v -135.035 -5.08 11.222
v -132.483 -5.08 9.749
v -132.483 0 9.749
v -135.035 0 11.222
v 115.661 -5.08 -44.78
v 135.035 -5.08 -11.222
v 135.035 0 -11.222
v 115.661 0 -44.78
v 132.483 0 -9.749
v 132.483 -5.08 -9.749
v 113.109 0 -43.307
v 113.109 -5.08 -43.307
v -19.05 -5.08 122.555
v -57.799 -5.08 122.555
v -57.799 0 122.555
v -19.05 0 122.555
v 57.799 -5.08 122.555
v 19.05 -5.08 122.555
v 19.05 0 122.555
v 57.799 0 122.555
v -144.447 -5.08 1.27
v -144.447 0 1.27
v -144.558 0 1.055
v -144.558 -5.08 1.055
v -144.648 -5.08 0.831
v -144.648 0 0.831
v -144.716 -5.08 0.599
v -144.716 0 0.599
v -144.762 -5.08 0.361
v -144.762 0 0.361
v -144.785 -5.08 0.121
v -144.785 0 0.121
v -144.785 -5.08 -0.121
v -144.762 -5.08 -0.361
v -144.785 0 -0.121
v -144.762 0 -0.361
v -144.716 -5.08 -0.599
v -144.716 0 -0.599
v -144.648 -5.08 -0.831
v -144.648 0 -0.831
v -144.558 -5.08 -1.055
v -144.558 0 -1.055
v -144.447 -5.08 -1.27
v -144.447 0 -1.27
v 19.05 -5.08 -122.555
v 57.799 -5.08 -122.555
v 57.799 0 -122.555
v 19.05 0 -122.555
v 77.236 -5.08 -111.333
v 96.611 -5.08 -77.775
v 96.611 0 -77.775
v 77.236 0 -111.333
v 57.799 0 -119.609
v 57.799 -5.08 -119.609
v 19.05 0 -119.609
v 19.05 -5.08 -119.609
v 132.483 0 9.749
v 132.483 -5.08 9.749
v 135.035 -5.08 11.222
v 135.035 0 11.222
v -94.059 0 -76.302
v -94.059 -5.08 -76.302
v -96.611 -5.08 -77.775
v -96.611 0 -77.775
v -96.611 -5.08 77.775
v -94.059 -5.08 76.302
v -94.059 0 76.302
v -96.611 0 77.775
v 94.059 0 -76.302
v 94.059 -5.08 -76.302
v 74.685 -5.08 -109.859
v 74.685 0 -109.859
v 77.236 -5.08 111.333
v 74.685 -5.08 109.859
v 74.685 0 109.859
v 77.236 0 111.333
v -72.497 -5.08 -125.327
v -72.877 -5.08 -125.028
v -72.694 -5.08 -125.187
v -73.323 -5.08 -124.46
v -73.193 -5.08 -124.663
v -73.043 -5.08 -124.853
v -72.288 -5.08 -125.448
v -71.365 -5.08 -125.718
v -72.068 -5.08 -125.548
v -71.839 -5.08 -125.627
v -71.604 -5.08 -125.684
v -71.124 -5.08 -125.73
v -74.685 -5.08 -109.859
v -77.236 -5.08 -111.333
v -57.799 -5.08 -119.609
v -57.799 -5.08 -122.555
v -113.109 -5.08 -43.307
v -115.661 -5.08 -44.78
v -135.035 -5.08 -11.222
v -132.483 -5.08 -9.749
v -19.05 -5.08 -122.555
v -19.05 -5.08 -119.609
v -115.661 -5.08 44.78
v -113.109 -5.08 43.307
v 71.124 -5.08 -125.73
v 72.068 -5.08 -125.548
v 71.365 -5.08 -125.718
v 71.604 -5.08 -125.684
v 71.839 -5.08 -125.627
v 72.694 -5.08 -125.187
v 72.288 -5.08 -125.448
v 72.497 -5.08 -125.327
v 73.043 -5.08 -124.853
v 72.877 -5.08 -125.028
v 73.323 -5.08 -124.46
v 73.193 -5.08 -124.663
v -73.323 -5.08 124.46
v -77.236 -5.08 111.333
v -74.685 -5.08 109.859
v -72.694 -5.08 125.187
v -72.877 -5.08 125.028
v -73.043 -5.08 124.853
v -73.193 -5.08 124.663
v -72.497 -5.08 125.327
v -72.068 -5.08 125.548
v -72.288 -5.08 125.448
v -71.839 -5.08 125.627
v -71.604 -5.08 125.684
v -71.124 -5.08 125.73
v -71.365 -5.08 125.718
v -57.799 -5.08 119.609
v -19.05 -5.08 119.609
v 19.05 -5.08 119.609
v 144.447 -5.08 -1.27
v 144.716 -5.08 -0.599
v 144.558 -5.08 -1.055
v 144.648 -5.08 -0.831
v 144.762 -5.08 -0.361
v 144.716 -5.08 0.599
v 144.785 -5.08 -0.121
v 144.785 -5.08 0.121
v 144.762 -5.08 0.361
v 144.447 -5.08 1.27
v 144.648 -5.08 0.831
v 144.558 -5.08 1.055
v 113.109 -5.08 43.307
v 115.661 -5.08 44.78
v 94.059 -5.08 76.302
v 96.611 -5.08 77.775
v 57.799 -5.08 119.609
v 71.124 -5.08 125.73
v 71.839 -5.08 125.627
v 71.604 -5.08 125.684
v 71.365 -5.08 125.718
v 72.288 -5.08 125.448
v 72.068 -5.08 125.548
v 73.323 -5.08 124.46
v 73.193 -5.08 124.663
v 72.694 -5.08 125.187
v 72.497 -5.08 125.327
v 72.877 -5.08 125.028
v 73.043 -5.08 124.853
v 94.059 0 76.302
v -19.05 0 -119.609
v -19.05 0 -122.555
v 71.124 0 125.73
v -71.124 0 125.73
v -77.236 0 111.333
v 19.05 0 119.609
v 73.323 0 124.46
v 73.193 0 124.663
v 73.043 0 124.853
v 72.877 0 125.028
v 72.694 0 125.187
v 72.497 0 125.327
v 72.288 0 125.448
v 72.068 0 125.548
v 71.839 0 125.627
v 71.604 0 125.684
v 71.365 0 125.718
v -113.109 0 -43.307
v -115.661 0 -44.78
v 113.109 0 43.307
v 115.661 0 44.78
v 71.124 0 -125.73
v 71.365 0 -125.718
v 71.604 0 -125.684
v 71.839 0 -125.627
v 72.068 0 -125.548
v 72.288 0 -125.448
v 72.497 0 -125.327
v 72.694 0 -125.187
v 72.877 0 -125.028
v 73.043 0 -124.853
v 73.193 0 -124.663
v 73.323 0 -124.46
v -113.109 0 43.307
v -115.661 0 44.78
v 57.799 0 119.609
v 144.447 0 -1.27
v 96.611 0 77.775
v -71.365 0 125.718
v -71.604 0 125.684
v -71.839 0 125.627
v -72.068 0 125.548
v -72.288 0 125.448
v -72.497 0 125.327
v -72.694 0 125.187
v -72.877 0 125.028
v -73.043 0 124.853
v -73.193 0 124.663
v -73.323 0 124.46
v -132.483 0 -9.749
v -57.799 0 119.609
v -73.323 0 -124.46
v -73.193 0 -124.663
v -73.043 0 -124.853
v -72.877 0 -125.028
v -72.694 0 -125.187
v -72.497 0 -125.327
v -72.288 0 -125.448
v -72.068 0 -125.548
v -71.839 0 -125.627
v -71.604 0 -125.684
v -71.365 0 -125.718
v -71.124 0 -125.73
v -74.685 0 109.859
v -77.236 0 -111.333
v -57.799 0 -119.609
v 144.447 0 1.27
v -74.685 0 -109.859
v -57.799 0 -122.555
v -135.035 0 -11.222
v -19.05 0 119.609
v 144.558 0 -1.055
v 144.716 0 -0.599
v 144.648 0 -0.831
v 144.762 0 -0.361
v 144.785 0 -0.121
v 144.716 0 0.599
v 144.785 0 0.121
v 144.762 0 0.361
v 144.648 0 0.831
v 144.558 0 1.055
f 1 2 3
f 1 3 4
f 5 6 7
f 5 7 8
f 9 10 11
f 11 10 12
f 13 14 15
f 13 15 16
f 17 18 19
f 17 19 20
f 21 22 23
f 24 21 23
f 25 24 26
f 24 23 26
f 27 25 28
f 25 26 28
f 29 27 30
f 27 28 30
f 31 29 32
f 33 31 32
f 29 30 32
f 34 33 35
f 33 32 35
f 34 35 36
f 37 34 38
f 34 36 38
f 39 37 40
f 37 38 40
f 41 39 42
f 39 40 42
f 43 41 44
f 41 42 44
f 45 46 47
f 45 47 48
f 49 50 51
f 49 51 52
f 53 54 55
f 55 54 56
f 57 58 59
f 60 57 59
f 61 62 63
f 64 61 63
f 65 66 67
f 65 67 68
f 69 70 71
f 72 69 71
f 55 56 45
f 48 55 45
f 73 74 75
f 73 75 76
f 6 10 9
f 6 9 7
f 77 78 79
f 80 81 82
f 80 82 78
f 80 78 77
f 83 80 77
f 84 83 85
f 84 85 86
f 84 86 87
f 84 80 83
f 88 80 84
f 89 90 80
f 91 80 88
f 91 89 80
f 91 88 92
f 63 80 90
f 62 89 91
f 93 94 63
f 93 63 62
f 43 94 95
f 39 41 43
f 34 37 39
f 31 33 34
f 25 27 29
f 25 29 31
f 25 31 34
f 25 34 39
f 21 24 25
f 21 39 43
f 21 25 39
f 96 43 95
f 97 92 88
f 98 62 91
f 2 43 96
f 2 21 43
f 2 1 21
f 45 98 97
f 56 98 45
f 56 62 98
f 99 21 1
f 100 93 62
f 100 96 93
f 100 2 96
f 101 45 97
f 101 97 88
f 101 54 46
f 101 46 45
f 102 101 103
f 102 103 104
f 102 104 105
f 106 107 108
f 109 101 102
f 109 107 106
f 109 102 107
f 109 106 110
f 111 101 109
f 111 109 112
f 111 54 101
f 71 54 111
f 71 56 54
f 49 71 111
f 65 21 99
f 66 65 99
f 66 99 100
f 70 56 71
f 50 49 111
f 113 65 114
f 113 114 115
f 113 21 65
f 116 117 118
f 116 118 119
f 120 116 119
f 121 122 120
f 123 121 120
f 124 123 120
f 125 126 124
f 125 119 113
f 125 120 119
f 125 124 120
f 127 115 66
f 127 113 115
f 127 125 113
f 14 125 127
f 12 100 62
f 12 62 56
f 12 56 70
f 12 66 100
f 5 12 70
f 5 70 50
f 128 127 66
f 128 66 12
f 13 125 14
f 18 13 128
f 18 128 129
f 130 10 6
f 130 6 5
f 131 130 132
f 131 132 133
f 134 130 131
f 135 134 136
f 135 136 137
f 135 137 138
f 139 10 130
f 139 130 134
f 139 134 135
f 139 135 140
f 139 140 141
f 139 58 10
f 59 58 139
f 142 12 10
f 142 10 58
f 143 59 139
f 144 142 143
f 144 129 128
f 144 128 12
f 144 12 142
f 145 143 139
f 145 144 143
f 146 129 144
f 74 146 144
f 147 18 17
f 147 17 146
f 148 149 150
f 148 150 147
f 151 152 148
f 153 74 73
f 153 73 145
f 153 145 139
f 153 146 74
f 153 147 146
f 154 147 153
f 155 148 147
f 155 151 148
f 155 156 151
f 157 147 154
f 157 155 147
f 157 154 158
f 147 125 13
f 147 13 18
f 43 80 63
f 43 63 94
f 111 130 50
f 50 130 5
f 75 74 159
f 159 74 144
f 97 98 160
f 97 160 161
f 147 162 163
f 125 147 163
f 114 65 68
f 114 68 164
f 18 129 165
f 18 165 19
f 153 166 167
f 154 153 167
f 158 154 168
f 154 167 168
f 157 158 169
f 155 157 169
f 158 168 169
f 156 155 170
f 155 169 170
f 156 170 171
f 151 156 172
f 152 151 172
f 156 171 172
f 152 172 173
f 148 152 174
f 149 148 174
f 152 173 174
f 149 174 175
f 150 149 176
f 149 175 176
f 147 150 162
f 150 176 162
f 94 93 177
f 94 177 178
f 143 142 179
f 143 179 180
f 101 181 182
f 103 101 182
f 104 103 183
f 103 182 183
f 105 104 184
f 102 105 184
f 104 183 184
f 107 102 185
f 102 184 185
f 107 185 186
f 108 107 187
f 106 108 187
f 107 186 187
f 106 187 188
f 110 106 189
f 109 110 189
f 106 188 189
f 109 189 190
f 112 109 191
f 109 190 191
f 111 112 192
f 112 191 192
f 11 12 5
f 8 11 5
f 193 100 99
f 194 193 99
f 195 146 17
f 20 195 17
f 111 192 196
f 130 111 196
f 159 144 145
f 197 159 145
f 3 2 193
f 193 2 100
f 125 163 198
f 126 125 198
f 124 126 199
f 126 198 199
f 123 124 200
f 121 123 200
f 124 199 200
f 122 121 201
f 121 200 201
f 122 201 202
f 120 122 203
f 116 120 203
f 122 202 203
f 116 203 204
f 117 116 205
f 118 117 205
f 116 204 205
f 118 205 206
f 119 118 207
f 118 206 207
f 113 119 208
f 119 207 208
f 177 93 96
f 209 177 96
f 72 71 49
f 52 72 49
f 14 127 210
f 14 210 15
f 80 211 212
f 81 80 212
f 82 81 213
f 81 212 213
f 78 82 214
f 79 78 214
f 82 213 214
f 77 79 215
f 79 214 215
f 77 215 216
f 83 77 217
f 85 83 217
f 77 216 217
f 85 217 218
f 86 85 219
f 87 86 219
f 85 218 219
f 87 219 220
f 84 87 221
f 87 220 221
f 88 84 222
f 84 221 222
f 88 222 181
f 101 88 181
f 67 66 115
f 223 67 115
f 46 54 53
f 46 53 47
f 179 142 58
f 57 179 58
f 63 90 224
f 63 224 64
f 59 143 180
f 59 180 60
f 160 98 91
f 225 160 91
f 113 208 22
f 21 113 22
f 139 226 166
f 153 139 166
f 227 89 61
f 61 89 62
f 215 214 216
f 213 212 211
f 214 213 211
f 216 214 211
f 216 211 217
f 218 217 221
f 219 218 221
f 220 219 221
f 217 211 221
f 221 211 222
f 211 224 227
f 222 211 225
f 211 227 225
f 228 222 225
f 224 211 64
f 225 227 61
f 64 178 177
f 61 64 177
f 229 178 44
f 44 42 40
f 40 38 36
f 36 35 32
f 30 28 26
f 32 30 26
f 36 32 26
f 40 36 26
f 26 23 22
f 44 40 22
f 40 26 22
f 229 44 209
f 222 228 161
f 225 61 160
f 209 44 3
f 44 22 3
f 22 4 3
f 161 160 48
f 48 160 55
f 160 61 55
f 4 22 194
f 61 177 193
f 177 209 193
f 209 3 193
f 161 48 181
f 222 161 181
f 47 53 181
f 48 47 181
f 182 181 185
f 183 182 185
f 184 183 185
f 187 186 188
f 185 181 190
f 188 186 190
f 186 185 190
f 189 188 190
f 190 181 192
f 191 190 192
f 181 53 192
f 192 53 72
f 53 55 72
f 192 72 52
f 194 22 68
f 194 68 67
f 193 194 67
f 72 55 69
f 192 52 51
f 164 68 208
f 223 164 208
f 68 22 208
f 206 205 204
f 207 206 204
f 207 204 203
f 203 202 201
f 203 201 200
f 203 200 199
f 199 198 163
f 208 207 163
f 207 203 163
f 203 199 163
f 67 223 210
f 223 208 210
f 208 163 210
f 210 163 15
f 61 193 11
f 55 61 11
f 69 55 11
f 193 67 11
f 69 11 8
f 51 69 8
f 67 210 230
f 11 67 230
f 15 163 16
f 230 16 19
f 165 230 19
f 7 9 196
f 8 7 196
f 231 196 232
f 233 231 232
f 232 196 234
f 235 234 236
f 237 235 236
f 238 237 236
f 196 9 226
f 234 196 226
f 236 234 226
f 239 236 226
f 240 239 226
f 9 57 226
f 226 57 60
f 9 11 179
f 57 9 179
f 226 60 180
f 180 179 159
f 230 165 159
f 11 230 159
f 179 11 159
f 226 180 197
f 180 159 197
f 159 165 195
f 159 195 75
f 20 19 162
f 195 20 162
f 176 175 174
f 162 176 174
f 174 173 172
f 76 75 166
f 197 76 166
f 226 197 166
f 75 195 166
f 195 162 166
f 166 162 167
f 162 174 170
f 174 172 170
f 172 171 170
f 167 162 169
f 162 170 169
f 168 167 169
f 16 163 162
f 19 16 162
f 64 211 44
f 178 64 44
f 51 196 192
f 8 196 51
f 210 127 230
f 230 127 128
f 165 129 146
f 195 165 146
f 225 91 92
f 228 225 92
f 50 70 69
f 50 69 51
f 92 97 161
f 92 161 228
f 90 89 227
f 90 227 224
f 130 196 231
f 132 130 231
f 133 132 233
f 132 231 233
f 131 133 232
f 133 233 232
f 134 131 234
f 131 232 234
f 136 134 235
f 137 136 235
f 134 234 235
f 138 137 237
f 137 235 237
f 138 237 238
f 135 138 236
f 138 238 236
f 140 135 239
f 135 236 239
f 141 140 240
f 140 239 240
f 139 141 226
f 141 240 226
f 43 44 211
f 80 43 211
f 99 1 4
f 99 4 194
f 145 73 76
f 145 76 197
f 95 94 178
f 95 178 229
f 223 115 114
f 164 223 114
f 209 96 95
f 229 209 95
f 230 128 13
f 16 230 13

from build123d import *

# Parameters (mm, degrees)
F1_DEPTH        = 5.08
F2_W            = 38.7485525078
F2_H            = 2.9464
F3_DEPTH        = 5.08
F3_COPIES_COUNT = 6


# Not quite as in the source:
# - a pattern or mirror of a feature is missing from the dataset's text; its kind, count and spacing are read off the source's solid


with BuildPart() as f1:
    # F0 (on Front) → F1 (new body)
    with BuildSketch(Plane.XZ):
        with BuildLine():
            Line((71.1237796615, 125.73), (-71.1237796615, 125.73))
            ThreePointArc((-71.1237796615, 125.73), (-72.3937796615, 125.3897045256), (-73.3234841871, 124.46))
            Line((-73.3234841871, 124.46), (-144.4472638486, 1.27))
            ThreePointArc((-144.4472638486, 1.27), (-144.7875593229, 0), (-144.4472638486, -1.27))
            Line((-144.4472638486, -1.27), (-73.3234841871, -124.46))
            ThreePointArc((-73.3234841871, -124.46), (-72.3937796615, -125.3897045256), (-71.1237796615, -125.73))
            Line((-71.1237796615, -125.73), (71.1237796615, -125.73))
            ThreePointArc((71.1237796615, -125.73), (72.3937796615, -125.3897045256), (73.3234841871, -124.46))
            Line((73.3234841871, -124.46), (144.4472638486, -1.27))
            ThreePointArc((144.4472638486, -1.27), (144.7875593229, 0), (144.4472638486, 1.27))
            Line((144.4472638486, 1.27), (73.3234841871, 124.46))
            ThreePointArc((73.3234841871, 124.46), (72.3937796615, 125.3897045256), (71.1237796615, 125.73))
        make_face()
    extrude(amount=F1_DEPTH)

    # F2 (on face) → F3 (cut, through all)
    with BuildSketch(Plane.XZ.offset(5.08)):
        with Locations((-38.4242762539, 121.0818)):
            Rectangle(F2_W, F2_H)
        with Locations((38.4242762539, 121.0818)):
            Rectangle(F2_W, F2_H)
    f3 = extrude(amount=-F3_DEPTH, mode=Mode.SUBTRACT)

    # F3_copies: F3 ×6 about axis
    f3_copies_axis = Axis((0, 0, 0), (0, 1, 0))
    for i in range(1, F3_COPIES_COUNT):
        add(f3.rotate(f3_copies_axis, i * 360 / F3_COPIES_COUNT), mode=Mode.SUBTRACT)


solid = f1.part
